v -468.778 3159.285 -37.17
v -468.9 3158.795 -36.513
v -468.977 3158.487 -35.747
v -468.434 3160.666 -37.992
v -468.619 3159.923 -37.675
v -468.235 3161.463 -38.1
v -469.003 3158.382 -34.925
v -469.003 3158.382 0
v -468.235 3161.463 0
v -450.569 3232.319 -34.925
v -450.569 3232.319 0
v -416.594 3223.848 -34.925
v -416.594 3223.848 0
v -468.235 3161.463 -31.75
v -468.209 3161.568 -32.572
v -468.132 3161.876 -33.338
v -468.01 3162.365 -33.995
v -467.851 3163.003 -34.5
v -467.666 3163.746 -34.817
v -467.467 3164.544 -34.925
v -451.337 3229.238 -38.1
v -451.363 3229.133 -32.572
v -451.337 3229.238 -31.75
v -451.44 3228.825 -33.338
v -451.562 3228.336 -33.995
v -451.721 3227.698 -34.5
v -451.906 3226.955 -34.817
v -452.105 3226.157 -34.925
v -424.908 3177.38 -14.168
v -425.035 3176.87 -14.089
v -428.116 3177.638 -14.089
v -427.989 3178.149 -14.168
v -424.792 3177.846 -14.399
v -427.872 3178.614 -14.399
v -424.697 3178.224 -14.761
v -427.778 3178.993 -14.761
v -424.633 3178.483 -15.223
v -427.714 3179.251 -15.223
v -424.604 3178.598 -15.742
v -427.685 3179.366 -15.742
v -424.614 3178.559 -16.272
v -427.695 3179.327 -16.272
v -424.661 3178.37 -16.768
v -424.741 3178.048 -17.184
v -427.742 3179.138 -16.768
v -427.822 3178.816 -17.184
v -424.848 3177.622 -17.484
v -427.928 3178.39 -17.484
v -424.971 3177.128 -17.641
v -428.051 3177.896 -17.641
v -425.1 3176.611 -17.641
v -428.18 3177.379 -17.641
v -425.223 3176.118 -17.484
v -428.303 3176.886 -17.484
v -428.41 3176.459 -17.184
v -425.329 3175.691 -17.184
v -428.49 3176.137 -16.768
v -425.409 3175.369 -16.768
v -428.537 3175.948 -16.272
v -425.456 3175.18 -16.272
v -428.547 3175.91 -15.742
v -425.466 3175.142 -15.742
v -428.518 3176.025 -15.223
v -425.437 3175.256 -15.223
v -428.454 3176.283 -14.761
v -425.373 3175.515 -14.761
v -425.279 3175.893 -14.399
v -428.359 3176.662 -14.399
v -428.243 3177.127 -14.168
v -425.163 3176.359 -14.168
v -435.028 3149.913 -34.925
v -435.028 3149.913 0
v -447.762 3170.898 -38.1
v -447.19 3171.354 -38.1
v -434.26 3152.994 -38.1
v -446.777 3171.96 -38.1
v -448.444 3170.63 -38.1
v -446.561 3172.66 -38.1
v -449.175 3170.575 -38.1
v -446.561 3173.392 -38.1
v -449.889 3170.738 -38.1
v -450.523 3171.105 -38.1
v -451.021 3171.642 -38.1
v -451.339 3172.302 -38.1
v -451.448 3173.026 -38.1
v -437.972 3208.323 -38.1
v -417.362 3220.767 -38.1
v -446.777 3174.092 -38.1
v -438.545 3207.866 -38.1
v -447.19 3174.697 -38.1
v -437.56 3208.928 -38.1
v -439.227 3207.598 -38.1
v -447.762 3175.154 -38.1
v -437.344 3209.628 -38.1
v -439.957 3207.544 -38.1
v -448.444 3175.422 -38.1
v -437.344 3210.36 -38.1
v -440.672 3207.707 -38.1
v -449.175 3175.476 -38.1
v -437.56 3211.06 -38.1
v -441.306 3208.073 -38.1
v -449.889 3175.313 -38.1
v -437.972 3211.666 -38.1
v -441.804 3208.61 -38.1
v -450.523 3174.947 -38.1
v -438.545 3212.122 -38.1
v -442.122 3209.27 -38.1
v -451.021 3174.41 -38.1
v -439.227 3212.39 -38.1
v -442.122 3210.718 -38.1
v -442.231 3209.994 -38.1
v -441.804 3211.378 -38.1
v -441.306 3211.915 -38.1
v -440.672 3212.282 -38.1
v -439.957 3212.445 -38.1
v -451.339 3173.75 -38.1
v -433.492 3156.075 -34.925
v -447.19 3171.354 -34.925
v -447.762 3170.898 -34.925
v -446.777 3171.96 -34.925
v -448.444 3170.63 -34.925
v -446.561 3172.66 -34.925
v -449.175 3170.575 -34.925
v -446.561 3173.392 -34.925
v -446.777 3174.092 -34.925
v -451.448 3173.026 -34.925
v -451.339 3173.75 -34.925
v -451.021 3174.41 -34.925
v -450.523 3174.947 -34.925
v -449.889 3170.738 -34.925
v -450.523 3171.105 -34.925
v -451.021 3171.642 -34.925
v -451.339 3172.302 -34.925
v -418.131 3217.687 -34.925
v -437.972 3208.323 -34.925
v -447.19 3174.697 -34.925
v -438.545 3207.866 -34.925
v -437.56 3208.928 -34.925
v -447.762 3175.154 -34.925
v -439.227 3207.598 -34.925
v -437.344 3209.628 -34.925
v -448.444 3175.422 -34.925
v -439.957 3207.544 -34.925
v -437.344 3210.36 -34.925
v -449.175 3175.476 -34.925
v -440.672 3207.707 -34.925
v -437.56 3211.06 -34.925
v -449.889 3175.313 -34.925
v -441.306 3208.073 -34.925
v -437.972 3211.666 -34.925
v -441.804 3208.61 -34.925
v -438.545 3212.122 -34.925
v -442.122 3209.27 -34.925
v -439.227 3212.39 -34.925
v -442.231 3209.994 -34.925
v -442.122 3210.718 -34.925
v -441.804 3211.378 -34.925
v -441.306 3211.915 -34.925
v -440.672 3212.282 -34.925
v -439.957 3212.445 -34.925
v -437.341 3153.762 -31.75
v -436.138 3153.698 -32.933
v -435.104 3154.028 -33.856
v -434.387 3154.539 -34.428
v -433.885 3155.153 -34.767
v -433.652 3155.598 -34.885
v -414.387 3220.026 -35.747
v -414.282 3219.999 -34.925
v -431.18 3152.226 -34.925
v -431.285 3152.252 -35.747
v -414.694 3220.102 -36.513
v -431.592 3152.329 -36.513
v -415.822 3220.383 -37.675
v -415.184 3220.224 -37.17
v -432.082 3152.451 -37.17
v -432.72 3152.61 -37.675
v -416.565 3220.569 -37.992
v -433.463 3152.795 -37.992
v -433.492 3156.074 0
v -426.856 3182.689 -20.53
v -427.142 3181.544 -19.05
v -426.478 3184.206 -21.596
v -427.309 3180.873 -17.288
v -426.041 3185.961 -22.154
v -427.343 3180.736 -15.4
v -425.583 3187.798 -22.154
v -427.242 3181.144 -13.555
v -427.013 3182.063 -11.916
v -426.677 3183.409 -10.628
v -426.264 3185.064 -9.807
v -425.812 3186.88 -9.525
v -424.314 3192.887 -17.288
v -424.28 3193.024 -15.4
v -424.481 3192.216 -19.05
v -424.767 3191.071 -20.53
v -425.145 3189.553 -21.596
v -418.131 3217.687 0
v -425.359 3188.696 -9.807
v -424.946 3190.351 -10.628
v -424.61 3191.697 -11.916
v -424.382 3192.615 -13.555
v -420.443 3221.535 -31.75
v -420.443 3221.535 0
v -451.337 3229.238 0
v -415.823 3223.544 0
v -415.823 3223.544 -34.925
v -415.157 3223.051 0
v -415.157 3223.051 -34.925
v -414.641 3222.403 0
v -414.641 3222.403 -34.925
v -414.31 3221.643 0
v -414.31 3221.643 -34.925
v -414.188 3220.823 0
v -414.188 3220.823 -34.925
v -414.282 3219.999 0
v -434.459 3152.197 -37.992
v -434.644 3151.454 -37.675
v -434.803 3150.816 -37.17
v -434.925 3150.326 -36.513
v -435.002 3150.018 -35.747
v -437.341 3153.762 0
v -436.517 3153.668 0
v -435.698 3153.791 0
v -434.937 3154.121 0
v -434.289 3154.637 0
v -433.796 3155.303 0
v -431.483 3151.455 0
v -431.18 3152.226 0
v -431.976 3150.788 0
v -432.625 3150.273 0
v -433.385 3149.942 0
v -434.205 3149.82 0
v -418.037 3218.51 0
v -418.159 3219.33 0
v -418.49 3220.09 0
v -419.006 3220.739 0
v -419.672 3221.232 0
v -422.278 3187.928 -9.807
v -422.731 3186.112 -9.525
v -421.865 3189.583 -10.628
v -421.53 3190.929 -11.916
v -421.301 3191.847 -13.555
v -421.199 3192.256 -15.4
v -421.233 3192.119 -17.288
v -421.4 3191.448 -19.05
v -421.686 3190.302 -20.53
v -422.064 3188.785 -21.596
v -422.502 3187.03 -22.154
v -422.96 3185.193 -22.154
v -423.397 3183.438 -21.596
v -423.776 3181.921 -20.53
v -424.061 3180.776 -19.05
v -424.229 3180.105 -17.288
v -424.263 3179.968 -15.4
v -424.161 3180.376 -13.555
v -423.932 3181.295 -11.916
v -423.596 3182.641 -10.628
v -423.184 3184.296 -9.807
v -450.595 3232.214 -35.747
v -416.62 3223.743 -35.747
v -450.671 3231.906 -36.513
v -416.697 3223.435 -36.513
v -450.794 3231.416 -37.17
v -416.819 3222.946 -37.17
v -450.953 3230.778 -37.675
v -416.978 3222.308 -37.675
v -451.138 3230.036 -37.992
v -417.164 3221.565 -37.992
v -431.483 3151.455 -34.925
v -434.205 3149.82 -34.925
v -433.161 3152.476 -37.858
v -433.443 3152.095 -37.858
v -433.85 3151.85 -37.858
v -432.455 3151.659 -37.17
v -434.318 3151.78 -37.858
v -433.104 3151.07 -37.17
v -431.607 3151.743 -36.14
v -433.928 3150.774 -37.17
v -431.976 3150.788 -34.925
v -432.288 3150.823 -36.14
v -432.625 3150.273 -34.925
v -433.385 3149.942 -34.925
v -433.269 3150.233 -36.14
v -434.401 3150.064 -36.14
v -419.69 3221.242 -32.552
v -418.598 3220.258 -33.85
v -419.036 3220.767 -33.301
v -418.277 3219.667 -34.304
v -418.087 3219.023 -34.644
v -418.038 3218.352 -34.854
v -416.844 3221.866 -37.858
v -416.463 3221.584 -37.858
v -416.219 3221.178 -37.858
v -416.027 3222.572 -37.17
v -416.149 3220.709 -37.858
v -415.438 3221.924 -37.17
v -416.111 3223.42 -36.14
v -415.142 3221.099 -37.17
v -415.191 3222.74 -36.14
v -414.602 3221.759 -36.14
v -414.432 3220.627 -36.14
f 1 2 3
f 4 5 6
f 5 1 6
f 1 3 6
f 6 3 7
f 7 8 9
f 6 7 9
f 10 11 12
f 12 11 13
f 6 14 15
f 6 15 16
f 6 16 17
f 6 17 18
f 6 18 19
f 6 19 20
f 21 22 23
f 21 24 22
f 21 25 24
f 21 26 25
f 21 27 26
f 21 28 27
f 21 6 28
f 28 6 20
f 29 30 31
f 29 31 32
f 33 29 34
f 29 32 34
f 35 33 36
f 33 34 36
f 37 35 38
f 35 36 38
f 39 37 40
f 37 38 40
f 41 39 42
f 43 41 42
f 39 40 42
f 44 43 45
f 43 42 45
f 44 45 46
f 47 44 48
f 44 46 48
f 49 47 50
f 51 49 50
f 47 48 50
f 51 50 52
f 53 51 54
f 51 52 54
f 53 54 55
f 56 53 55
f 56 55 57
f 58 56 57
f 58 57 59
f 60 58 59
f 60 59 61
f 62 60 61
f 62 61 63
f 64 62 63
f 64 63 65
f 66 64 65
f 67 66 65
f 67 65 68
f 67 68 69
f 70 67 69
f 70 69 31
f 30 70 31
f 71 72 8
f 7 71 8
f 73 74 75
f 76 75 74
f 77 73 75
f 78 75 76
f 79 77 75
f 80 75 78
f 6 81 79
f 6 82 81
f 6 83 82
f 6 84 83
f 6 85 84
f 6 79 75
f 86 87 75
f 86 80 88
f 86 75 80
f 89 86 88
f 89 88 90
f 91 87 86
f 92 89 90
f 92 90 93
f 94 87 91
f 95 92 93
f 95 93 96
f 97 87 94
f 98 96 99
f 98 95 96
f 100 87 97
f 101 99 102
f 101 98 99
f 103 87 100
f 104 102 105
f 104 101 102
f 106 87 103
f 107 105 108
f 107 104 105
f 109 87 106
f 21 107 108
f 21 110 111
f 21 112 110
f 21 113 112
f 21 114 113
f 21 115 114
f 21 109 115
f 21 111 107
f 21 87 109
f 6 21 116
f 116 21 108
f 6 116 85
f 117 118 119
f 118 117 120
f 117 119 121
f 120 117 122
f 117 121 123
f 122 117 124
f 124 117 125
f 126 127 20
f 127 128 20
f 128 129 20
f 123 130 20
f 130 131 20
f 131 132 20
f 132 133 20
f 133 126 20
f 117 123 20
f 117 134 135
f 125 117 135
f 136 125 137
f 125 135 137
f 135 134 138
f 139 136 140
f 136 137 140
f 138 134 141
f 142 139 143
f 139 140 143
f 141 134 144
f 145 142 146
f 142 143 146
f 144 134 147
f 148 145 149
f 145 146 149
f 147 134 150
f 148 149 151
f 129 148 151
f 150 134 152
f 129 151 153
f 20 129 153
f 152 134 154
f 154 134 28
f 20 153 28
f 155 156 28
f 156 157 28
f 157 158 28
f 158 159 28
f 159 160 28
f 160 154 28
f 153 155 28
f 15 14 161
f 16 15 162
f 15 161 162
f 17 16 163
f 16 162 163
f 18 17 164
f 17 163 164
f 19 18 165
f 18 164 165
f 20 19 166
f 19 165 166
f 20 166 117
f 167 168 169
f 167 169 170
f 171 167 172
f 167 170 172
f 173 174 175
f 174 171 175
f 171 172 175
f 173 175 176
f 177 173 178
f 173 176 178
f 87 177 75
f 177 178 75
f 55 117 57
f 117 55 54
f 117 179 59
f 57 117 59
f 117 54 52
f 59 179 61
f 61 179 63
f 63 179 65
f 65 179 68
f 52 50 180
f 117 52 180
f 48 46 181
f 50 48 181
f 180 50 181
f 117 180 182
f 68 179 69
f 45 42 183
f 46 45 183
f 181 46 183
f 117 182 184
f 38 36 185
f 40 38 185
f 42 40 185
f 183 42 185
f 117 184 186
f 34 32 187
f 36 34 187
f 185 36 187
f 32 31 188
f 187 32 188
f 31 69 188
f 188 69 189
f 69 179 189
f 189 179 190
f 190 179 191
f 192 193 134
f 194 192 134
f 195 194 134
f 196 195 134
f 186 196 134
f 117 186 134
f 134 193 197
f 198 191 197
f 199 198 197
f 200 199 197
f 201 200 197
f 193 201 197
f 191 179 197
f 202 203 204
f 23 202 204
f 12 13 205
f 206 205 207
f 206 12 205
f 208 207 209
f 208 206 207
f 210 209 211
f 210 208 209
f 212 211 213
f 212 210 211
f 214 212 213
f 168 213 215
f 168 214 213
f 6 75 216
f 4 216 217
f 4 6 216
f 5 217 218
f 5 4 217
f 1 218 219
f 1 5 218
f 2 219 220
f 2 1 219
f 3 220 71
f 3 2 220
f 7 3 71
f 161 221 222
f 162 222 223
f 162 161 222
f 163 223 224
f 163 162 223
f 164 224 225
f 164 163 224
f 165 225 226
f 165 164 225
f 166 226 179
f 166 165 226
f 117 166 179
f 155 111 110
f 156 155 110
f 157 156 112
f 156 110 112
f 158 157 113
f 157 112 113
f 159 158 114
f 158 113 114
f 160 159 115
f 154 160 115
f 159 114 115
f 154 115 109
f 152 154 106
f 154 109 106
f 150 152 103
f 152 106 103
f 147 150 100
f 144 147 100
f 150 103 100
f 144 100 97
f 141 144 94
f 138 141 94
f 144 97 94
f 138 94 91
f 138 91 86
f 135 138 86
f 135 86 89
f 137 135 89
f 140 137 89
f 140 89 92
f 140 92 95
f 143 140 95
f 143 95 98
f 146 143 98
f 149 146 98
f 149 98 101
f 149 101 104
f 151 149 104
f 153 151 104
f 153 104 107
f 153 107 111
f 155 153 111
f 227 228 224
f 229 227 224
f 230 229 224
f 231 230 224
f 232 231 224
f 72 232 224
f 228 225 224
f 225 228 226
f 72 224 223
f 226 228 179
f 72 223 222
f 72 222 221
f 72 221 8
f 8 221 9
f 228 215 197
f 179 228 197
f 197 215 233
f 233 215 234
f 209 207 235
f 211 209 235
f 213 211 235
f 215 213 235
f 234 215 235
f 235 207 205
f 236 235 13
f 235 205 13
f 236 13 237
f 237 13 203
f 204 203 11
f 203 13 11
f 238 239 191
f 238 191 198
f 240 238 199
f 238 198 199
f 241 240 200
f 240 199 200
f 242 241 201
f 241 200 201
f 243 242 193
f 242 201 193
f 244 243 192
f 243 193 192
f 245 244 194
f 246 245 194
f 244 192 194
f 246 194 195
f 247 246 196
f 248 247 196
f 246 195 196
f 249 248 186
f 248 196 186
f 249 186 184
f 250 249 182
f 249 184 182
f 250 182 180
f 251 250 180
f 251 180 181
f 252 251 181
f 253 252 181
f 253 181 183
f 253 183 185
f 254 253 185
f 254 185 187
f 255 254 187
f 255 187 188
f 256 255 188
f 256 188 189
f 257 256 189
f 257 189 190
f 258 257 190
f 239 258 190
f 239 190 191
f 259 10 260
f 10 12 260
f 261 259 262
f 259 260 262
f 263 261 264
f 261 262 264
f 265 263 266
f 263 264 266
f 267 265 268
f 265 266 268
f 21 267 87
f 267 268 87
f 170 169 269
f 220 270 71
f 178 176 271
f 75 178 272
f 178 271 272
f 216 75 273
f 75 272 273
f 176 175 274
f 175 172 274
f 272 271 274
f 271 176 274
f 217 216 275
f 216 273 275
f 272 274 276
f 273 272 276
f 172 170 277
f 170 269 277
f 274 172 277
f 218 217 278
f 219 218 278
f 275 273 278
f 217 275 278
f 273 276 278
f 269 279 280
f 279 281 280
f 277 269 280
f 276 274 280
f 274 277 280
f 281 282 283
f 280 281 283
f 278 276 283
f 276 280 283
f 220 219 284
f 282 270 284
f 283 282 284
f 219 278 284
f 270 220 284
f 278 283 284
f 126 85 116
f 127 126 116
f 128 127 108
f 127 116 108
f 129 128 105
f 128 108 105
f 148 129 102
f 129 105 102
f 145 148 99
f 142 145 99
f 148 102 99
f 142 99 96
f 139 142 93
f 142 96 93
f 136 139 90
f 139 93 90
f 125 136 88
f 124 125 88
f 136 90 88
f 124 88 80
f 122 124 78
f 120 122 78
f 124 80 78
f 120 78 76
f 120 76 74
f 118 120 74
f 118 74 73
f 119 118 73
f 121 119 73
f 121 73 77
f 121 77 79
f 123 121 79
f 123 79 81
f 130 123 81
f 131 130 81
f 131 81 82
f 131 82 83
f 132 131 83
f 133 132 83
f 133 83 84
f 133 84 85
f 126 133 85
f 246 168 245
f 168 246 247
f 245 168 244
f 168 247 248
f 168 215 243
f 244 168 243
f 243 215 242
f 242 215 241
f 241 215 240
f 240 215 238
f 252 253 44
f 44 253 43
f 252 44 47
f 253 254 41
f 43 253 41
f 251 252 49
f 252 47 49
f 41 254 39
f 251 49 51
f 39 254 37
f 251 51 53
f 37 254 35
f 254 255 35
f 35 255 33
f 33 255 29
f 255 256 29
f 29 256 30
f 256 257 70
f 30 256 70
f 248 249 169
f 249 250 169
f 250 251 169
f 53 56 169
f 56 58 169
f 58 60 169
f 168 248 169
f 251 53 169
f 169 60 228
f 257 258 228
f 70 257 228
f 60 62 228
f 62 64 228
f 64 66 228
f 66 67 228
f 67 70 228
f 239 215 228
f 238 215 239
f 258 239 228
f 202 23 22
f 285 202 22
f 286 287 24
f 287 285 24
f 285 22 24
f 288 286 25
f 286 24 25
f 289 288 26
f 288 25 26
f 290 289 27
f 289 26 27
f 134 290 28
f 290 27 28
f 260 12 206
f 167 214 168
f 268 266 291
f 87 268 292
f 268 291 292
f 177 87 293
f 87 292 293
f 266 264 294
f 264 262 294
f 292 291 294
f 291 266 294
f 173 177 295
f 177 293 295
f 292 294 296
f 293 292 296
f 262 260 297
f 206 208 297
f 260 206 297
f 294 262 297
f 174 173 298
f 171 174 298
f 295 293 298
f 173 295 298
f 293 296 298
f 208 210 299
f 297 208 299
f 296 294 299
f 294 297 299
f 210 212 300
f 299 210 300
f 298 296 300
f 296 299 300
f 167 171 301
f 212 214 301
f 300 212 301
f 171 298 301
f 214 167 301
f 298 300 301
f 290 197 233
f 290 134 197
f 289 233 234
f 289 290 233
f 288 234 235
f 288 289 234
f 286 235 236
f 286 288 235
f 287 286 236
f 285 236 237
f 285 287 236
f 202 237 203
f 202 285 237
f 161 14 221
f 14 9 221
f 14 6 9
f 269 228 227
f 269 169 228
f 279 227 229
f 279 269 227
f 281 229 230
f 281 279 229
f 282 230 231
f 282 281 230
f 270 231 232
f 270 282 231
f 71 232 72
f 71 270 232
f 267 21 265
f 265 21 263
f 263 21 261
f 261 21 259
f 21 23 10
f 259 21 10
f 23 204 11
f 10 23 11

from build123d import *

# Parameters (mm, degrees)
EXTRUDE_THIN1_DEPTH             = 38.1
BOSS_EXTRUDE1_DEPTH             = 3.175
F_8_CLEARANCE_HOLE1_D           = 4.9149
FILLET1_R                       = 3.175
F_1_2_0_5_DIAMETER_HOLE1_D      = 12.7
F_9_64_0_14063_DIAMETER_HOLE1_D = 3.572002


with BuildPart() as part:
    # Sketch1 → Extrude-Thin1 (new body)
    with BuildSketch(Plane.XY):
        Polygon((-450.568590055, 3232.318777264), (-413.513639003, 3223.079940323), (-431.947583815, 3149.145425944), (-469.0030385, 3158.382242922), (-468.235104419, 3161.462973719), (-434.260212597, 3152.994048962), (-417.362429953, 3220.76735341), (-451.336692074, 3229.238088333), align=None)
    extrude(amount=-EXTRUDE_THIN1_DEPTH)

    # Sketch2 → Boss-Extrude1 (add)
    with BuildSketch(Plane(origin=(0, 0, -38.1), x_dir=(-1, 0, 0), z_dir=(0, 0, -1))):
        Polygon((413.513639003, 3223.079940323), (431.947583815, 3149.145425944), (469.0030385, 3158.382242922), (450.568590055, 3232.318777264), align=None)
    extrude(amount=-BOSS_EXTRUDE1_DEPTH)

    # #8 Clearance Hole1 (through all)
    with Locations(Plane.XY.offset(-34.925)):
        with Locations((-439.773757512, 3209.994133586), (-448.990981734, 3173.025866414)):
            Hole(F_8_CLEARANCE_HOLE1_D / 2)

    # Fillet1
    fillet1_edges = [part.edges().sort_by_distance(p)[0] for p in [
        (-413.513639003, 3223.079940323, -19.05),
        (-417.362429953, 3220.76735341, -17.4625),
        (-434.349561013, 3225.002720872, -34.925),
        (-451.247574539, 3157.228490409, -34.925),
        (-434.260212597, 3152.994048962, -17.4625),
        (-450.475311157, 3153.763834433, -38.1),
        (-431.947583815, 3149.145425944, -19.05),
        (-432.041114529, 3227.699358793, -38.1),
        (-422.730611409, 3186.112683133, -38.1),
    ]]
    fillet(fillet1_edges, radius=FILLET1_R - 0.0001)  # a hair under: the kernel refuses the full size

    # 1/2 (0.5) Diameter Hole1 (through all)
    with Locations(Plane(origin=(-1145.884443872, 285.70107988, 0), x_dir=(0, 0, -1), z_dir=(0.9702957262759976, -0.24192189559966307, 0))):
        with Locations((15.875, 2989.202688137)):
            Hole(F_1_2_0_5_DIAMETER_HOLE1_D / 2)

    # 9/64 (0.14063) Diameter Hole1 (through all)
    with Locations(Plane(origin=(-1145.884443872, 285.70107988, 0), x_dir=(0, 0, -1), z_dir=(0.9702957262759976, -0.24192189559966307, 0))):
        with Locations((15.875, 2979.677688137)):
            Hole(F_9_64_0_14063_DIAMETER_HOLE1_D / 2)


solid = part.part
